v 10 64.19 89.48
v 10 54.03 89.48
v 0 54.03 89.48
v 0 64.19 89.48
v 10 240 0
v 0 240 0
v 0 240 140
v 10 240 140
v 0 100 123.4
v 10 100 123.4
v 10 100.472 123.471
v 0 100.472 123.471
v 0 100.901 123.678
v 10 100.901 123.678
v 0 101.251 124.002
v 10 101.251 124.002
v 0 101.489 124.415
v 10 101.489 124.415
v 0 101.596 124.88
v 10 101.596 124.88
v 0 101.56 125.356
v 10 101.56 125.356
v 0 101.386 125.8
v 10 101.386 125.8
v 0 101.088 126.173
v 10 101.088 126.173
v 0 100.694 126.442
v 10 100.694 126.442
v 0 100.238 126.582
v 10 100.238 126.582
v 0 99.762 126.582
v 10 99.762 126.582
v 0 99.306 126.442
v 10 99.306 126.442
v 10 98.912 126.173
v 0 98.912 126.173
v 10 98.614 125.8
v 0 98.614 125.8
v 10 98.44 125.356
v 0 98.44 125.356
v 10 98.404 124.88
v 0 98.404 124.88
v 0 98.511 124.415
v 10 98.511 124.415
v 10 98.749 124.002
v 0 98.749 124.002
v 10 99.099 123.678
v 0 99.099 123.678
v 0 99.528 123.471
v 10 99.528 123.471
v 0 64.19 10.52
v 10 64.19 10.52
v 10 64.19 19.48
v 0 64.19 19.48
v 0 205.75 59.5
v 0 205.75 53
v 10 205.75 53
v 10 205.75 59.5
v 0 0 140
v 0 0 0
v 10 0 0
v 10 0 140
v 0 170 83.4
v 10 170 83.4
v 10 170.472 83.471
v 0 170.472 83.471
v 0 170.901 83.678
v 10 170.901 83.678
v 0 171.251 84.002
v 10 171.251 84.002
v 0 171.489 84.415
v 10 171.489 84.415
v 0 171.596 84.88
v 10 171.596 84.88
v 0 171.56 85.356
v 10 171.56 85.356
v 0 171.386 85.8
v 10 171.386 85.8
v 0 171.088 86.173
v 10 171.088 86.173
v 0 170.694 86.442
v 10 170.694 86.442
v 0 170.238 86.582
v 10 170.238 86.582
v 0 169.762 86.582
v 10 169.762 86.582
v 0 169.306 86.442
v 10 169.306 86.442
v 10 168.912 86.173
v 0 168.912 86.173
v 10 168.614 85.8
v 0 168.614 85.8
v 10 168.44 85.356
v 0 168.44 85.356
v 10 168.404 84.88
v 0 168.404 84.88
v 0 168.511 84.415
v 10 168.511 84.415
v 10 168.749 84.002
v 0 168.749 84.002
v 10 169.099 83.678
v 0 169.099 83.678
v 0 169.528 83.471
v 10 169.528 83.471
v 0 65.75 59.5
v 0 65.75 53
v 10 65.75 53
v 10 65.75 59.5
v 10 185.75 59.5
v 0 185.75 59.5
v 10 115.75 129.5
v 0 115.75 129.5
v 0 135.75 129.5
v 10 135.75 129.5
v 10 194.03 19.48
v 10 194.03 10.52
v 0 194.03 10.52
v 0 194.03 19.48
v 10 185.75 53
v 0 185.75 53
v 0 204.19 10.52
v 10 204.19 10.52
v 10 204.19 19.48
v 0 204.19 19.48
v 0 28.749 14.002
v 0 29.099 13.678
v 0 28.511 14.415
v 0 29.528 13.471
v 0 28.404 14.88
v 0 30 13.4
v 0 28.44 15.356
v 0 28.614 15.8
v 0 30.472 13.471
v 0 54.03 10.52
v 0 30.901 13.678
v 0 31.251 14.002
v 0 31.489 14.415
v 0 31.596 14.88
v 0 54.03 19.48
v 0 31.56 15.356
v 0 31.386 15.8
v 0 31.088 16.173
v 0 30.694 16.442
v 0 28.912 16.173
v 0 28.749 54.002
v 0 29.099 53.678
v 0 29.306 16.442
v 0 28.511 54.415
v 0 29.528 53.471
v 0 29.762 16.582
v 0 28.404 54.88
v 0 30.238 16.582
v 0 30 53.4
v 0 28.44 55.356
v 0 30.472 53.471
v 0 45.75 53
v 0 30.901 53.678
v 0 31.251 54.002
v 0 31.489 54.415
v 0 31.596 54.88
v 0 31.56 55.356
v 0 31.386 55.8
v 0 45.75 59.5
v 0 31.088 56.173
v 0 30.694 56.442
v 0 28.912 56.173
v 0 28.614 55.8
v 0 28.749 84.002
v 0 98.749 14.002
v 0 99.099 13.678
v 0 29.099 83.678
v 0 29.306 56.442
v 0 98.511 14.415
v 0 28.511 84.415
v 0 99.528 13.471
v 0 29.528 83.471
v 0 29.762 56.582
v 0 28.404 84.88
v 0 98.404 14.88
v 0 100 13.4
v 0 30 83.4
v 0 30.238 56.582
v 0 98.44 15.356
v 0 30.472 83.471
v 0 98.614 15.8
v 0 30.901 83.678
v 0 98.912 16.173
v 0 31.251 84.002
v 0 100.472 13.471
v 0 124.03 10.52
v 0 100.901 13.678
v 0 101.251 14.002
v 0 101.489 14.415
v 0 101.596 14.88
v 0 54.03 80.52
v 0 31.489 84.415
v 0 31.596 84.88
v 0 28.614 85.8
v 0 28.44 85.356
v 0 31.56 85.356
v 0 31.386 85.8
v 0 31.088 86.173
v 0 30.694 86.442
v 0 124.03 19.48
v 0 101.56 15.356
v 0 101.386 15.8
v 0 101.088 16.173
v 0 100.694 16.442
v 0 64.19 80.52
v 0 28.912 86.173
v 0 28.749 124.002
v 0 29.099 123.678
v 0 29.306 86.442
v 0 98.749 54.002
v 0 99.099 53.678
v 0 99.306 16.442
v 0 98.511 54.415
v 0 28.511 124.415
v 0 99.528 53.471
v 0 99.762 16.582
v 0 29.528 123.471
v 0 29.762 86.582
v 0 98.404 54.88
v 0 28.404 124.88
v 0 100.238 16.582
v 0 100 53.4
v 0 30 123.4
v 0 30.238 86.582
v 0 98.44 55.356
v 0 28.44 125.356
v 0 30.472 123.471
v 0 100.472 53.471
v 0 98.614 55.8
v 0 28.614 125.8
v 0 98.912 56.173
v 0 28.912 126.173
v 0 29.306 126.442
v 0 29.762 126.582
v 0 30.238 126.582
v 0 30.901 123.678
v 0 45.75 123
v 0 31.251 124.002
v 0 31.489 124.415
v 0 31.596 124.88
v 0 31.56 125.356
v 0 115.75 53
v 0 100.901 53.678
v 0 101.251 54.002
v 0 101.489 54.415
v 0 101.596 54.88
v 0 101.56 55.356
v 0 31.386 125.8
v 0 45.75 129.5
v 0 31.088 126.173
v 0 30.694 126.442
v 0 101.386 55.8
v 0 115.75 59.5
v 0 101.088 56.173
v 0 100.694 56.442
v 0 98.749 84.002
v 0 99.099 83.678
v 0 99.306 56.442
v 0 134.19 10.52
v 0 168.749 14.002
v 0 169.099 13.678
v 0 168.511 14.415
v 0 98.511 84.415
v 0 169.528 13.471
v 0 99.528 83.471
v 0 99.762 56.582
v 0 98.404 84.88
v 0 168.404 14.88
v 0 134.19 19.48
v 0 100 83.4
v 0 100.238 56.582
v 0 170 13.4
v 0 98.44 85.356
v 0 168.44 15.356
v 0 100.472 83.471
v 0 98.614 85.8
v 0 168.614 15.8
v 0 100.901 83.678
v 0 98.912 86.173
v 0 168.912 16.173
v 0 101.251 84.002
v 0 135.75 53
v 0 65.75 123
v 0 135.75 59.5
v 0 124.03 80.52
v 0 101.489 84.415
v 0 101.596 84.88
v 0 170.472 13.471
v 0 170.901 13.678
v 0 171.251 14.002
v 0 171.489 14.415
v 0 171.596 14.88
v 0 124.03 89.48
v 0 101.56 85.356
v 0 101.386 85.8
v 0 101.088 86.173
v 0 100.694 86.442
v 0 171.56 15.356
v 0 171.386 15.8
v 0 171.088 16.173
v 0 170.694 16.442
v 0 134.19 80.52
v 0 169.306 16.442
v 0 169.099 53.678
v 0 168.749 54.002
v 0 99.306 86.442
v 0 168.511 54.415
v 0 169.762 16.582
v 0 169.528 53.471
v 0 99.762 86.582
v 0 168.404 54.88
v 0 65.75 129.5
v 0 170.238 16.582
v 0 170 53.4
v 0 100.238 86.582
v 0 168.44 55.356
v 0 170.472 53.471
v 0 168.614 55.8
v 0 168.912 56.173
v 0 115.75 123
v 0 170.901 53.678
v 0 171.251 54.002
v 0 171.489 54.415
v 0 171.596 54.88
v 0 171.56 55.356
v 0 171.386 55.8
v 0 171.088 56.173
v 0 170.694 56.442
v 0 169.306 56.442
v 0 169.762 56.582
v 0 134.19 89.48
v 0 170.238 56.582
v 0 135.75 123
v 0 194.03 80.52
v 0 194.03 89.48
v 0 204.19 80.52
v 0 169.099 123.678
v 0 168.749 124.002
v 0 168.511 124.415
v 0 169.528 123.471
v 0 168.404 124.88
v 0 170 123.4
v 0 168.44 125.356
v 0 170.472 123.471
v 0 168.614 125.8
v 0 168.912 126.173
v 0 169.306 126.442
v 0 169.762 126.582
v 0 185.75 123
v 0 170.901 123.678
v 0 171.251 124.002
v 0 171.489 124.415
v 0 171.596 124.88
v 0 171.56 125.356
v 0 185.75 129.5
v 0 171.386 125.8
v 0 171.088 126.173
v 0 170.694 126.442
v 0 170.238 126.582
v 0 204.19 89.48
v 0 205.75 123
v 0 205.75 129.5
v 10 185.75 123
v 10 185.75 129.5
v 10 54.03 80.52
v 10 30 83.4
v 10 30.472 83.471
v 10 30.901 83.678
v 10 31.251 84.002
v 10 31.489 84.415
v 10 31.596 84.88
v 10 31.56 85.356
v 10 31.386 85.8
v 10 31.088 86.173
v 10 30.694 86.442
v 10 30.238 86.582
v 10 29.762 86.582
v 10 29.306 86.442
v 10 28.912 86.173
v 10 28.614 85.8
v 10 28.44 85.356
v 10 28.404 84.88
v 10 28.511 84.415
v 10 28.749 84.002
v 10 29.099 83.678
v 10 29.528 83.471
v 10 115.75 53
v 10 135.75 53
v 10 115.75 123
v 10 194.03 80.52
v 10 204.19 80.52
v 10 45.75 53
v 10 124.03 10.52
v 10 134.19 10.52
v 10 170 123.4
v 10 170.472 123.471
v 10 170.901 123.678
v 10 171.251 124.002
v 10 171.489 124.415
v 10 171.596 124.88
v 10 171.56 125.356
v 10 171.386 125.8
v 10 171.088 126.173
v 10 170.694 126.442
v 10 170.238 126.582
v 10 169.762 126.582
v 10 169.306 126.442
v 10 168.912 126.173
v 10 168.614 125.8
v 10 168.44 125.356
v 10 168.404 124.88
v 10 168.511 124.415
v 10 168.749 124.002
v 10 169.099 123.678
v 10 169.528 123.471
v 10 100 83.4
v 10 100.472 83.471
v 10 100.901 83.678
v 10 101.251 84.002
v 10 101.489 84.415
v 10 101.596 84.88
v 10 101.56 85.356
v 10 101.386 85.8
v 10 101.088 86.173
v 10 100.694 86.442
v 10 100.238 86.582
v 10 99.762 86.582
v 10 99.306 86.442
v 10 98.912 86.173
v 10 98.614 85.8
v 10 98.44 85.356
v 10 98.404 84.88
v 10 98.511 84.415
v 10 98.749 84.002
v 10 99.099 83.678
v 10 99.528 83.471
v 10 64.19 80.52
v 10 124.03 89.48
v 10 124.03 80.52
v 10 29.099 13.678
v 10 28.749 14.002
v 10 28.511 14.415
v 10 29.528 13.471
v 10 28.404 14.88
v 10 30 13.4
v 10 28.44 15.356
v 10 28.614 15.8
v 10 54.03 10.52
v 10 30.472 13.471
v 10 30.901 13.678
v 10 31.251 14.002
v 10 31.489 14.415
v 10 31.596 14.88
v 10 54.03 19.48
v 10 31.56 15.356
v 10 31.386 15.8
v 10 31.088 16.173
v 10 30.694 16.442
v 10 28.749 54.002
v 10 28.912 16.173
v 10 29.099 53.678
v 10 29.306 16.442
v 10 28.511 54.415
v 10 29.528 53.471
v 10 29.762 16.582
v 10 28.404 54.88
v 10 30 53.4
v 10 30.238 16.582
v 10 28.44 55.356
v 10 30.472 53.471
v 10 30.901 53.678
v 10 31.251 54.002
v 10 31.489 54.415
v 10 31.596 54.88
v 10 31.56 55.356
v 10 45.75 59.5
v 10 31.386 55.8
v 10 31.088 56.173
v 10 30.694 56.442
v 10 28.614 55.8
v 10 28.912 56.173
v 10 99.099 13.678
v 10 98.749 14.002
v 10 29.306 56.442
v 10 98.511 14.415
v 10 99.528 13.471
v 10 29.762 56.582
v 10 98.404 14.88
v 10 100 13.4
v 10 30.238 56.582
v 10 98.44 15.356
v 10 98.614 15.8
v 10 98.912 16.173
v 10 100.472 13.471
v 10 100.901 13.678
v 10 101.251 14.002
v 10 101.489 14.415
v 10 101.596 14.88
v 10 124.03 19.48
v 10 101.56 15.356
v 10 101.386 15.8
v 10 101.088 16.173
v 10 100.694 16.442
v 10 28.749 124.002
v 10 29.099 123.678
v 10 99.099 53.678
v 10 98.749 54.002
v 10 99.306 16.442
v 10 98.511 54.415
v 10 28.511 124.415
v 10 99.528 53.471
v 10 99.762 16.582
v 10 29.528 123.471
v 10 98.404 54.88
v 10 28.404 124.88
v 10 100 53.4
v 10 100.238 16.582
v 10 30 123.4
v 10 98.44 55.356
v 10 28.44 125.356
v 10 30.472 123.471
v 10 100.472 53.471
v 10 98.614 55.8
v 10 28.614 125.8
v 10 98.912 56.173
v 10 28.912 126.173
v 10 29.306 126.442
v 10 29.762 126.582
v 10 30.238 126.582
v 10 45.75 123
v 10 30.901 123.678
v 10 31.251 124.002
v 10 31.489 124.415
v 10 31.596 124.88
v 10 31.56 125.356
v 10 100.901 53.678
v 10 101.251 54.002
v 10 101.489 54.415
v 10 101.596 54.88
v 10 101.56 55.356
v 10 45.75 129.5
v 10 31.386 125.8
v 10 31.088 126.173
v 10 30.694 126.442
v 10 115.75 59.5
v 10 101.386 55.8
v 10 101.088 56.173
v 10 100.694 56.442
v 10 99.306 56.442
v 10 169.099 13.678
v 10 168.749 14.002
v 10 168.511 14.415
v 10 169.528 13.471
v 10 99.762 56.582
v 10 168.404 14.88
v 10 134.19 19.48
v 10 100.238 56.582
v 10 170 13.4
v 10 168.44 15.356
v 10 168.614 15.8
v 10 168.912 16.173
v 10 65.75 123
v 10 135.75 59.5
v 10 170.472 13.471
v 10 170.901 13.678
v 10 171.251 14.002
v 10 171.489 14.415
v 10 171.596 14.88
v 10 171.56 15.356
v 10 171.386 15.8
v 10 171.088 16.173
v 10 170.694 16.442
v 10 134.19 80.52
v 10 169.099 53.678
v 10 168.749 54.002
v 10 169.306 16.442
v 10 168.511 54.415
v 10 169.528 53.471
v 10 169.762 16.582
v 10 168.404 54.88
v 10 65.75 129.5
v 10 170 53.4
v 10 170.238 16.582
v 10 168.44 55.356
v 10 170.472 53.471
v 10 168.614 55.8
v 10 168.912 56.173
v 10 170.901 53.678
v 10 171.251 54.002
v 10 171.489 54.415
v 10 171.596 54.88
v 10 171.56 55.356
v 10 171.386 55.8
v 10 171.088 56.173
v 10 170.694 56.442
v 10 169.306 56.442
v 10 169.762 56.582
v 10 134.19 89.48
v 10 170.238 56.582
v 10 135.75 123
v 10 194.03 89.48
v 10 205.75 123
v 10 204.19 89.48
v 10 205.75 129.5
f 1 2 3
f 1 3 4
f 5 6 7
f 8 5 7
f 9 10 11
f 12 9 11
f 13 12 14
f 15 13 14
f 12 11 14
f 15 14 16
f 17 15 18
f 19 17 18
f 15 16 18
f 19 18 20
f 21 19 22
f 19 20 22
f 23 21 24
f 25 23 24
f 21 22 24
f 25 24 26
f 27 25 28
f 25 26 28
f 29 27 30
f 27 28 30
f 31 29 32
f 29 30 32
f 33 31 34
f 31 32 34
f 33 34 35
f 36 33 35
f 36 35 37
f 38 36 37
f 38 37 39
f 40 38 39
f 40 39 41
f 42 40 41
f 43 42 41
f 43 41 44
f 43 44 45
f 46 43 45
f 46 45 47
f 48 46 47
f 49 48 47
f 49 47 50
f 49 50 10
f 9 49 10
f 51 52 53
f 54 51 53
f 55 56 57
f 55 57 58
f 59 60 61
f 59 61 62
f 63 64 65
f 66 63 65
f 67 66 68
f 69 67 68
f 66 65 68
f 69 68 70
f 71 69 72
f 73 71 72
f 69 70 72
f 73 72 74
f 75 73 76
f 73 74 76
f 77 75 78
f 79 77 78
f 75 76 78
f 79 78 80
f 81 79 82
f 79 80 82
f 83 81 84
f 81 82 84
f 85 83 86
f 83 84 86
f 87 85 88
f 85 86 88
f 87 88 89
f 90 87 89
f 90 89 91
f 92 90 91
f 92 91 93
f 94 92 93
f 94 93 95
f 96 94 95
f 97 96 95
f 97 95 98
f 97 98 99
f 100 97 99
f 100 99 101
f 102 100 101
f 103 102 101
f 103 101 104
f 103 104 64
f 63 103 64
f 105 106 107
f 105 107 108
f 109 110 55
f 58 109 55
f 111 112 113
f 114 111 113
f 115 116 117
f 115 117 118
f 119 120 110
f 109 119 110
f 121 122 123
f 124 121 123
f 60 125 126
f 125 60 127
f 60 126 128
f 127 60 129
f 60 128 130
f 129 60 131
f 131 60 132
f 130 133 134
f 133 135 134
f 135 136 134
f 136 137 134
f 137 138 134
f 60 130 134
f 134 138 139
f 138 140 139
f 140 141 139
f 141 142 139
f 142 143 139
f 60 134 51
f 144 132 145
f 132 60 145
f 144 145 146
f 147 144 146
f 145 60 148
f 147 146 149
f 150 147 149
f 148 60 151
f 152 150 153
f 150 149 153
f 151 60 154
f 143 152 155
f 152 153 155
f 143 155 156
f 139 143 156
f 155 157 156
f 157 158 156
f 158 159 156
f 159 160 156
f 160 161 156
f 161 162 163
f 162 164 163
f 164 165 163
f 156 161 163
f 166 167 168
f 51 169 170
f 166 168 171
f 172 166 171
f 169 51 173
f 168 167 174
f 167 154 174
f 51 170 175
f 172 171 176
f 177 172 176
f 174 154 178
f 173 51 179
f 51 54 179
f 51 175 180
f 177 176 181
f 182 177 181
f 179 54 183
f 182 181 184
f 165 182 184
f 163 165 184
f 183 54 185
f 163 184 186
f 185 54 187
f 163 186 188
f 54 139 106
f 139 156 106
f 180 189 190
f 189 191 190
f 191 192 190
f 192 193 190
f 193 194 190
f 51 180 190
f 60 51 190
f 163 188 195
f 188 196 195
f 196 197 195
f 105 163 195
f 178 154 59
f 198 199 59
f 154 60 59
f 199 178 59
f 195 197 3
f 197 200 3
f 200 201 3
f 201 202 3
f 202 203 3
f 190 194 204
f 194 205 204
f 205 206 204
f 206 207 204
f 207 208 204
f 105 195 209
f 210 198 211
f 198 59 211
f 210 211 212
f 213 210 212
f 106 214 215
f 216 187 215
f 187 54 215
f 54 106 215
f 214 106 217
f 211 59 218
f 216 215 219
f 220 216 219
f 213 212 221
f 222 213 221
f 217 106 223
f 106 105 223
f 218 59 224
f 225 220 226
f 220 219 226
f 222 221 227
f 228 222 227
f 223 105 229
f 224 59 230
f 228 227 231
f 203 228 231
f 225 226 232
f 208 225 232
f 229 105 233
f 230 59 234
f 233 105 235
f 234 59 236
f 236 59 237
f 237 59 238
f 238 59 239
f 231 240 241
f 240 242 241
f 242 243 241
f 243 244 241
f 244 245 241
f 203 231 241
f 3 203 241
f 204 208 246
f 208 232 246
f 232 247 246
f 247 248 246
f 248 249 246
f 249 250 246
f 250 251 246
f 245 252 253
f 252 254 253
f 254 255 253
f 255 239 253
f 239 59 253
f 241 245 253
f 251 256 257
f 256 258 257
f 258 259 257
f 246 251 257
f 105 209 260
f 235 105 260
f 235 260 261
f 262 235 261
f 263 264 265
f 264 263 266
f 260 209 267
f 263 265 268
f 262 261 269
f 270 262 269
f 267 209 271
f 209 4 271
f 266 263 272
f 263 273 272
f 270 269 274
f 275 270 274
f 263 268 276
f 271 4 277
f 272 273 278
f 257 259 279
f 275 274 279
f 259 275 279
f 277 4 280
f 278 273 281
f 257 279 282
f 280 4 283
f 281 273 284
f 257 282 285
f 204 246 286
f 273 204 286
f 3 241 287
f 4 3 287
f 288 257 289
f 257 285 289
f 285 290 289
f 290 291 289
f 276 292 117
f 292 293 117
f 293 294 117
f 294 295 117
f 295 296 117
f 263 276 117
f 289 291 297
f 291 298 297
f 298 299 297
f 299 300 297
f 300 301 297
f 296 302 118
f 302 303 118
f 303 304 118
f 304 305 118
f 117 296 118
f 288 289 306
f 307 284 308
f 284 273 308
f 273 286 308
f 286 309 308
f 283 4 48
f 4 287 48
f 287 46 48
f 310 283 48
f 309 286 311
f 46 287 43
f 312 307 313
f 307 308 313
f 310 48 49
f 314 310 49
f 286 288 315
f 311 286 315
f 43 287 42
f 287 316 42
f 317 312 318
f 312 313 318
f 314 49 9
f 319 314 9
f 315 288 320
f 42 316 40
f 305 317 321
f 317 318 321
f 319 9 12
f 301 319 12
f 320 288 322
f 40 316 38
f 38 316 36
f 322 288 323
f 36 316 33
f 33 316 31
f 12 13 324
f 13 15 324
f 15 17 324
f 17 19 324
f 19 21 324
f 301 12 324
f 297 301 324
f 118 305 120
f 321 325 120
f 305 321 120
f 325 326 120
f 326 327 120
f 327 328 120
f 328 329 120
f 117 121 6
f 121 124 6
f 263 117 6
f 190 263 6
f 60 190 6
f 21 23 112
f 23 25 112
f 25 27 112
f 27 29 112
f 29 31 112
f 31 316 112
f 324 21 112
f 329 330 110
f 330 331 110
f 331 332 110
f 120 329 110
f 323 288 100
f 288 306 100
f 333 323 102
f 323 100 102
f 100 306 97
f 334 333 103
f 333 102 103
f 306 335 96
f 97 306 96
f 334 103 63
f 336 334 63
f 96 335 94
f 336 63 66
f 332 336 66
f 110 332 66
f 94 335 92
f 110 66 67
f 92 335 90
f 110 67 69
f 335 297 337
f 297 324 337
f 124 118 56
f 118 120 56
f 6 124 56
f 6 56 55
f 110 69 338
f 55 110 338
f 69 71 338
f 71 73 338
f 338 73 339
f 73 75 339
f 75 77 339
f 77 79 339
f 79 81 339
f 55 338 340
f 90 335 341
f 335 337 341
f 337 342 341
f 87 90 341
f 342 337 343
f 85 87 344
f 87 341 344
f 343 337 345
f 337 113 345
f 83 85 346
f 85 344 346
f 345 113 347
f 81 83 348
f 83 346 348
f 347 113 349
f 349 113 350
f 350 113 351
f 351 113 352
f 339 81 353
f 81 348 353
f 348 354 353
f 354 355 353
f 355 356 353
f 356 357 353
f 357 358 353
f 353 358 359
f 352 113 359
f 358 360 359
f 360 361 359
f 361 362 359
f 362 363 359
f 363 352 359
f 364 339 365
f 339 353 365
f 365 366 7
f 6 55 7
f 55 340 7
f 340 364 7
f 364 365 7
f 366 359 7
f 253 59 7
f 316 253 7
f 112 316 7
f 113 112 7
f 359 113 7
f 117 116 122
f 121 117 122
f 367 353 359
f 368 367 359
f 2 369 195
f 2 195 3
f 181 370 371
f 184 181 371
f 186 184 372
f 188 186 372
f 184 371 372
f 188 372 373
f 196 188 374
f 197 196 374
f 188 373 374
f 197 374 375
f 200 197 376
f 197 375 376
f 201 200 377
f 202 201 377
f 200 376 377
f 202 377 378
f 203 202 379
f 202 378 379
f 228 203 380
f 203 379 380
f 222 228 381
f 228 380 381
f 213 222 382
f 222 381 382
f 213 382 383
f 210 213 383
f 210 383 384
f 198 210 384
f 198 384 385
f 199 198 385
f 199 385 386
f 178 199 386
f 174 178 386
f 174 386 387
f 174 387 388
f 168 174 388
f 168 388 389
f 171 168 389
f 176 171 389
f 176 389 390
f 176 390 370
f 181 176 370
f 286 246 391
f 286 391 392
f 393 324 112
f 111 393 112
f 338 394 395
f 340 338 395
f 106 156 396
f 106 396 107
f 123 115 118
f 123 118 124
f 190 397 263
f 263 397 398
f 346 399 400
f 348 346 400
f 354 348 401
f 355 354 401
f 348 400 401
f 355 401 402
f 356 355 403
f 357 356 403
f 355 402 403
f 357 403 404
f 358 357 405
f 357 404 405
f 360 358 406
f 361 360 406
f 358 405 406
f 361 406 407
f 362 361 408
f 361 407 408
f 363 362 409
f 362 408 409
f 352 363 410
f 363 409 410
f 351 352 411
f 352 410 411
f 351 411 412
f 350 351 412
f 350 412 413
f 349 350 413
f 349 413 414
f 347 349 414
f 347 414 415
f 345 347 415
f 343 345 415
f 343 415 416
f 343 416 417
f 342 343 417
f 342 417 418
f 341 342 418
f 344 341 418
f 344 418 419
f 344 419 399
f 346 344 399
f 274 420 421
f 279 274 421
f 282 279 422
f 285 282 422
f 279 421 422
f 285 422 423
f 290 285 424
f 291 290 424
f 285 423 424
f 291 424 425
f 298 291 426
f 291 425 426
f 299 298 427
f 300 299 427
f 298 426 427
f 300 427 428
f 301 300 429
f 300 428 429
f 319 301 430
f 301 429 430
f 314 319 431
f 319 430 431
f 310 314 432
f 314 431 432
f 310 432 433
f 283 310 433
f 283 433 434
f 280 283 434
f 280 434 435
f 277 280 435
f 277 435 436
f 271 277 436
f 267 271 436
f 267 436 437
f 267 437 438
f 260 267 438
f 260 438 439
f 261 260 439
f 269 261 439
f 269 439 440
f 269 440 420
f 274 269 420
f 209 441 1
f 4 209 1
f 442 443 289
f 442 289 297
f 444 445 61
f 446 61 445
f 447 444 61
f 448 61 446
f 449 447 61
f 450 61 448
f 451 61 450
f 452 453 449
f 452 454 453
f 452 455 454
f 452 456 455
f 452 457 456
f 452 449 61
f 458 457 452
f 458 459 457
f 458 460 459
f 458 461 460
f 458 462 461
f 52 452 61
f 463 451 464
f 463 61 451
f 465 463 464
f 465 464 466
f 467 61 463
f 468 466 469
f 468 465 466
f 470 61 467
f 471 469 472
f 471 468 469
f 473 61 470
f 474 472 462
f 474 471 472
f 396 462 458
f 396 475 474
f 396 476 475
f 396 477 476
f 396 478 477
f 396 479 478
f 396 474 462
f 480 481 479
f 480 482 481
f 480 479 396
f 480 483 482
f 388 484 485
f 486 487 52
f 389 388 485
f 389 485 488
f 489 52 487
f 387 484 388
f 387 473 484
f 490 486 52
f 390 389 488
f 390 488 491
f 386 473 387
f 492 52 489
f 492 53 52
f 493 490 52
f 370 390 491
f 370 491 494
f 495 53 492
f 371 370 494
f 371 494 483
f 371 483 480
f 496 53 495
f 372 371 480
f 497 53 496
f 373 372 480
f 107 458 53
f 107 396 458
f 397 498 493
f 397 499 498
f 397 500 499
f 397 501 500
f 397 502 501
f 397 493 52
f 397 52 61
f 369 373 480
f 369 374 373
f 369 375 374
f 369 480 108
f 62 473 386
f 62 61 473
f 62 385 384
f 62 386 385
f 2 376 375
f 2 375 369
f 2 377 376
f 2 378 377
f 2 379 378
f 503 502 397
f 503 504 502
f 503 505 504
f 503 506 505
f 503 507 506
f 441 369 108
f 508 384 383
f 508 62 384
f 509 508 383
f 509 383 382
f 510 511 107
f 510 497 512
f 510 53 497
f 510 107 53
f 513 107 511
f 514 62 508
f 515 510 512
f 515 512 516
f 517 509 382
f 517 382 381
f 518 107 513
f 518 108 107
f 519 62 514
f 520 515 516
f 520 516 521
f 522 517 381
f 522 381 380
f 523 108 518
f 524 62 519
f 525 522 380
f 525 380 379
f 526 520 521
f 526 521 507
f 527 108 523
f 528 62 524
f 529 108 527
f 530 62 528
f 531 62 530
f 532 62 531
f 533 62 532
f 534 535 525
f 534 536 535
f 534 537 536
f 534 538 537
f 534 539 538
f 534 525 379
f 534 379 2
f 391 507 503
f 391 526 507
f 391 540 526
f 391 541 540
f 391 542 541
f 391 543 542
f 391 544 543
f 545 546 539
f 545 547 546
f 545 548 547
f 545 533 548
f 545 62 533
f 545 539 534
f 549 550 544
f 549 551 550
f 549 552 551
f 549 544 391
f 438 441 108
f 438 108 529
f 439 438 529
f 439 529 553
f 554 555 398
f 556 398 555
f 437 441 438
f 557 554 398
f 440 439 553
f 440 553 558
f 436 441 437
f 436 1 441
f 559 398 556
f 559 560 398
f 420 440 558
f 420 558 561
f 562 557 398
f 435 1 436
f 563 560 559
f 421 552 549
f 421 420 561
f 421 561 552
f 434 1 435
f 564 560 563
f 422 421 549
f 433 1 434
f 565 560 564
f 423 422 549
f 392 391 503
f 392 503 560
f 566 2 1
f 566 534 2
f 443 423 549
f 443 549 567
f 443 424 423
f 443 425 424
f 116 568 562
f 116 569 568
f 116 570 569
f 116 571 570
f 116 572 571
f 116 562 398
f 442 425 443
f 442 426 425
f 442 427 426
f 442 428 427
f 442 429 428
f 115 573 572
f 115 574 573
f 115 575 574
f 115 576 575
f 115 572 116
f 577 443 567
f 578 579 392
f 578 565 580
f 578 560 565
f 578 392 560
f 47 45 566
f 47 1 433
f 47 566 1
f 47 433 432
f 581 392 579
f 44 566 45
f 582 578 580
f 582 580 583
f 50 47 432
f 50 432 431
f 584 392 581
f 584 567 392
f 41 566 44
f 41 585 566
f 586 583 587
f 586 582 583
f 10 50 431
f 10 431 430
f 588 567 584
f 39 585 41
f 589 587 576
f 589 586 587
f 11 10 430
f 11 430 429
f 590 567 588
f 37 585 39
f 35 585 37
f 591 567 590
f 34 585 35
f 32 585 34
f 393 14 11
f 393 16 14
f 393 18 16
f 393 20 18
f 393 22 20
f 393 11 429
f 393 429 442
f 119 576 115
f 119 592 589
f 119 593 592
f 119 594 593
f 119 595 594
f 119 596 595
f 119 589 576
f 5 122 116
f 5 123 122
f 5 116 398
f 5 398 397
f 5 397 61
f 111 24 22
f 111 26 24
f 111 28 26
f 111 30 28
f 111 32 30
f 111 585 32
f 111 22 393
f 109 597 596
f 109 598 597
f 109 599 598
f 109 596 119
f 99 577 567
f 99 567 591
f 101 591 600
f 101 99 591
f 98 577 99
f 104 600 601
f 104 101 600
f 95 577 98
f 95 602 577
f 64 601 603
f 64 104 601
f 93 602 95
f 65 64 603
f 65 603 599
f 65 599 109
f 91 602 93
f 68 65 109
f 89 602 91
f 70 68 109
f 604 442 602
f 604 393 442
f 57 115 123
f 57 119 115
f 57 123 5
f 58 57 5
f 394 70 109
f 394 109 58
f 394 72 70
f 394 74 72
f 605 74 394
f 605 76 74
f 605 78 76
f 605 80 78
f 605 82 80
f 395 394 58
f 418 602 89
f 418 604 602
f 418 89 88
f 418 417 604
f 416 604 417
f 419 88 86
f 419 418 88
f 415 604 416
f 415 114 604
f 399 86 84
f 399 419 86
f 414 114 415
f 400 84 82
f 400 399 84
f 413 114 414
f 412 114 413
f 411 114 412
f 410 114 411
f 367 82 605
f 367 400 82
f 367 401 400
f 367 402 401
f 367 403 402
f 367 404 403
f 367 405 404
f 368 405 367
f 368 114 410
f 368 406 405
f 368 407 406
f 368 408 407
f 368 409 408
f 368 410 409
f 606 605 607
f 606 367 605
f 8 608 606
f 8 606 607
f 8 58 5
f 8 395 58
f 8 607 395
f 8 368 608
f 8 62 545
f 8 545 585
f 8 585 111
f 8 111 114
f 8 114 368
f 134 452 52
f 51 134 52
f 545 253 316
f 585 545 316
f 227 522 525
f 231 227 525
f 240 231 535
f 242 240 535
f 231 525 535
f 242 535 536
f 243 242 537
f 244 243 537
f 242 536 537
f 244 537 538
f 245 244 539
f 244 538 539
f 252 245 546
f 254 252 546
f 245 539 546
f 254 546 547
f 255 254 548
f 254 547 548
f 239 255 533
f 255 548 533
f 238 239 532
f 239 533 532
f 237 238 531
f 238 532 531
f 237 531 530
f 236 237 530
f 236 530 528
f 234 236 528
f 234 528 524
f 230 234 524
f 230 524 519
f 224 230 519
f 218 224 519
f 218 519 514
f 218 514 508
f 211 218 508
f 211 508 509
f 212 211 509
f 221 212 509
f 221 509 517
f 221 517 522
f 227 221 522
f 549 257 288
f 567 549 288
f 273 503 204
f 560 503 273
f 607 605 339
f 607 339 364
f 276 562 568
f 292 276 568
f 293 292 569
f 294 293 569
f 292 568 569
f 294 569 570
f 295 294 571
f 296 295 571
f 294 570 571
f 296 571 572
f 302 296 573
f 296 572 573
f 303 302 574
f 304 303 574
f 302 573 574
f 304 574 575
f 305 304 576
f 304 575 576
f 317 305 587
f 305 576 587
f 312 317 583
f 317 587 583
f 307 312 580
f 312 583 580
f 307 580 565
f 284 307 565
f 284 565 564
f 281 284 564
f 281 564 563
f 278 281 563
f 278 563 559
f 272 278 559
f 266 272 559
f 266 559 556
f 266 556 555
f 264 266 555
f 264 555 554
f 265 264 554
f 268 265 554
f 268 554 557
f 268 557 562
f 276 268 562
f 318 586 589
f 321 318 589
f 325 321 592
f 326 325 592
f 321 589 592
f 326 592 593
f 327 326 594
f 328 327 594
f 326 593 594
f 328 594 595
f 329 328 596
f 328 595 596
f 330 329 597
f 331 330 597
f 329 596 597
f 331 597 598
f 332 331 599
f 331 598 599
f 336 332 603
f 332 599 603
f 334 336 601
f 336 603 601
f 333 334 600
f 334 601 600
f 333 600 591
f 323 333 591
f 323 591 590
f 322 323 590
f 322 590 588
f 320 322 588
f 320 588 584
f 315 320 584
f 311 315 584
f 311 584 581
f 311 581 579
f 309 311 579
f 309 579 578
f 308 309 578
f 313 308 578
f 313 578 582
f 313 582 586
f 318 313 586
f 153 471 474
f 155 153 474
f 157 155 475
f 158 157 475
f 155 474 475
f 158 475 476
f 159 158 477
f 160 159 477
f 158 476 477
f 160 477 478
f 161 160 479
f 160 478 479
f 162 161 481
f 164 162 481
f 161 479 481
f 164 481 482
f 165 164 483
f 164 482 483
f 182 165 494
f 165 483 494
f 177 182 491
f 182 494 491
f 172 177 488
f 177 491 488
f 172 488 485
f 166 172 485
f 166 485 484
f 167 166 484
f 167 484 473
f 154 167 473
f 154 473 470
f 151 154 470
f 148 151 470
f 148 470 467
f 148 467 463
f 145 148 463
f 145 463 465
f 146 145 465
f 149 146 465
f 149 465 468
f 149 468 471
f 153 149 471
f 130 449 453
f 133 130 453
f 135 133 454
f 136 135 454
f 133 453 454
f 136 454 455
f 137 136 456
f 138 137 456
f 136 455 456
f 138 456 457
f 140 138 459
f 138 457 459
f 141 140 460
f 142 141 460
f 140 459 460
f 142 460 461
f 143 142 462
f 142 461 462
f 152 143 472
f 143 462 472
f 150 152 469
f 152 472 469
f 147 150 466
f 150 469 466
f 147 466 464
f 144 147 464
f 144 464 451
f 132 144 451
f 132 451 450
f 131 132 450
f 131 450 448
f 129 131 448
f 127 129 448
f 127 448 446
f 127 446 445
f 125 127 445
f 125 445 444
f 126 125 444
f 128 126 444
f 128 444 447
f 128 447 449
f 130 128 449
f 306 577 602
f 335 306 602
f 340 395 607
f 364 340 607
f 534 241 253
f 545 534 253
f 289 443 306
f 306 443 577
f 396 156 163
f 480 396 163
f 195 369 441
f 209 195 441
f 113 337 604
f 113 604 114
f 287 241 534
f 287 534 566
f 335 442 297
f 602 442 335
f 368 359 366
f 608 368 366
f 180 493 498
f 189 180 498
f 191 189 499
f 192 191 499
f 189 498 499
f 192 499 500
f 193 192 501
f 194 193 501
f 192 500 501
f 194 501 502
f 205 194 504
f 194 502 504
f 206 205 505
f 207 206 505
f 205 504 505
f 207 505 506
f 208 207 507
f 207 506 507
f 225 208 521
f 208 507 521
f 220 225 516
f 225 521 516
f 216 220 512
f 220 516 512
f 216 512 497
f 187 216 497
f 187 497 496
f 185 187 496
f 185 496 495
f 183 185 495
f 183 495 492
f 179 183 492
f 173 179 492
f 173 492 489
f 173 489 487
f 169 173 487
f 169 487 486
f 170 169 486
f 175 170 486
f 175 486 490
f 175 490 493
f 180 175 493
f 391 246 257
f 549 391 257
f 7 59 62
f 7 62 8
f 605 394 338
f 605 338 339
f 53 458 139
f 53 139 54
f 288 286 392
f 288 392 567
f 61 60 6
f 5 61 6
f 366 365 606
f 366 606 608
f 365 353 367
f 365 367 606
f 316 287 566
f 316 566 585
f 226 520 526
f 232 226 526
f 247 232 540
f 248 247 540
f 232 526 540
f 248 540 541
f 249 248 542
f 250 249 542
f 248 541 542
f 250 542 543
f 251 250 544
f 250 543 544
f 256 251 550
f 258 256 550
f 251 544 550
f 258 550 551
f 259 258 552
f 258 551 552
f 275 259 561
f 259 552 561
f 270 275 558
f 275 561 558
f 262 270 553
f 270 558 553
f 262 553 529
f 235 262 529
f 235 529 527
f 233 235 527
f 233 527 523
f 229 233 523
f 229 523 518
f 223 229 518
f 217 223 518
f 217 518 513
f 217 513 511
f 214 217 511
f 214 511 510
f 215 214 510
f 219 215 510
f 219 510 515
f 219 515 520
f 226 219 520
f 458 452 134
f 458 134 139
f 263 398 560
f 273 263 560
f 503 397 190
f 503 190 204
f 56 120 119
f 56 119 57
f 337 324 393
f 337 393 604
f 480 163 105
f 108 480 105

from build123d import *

# Parameters (mm, degrees)
CROQUIS2_W              = 240
CROQUIS2_H              = 140
SALIENTE_EXTRUIR1_DEPTH = 10
CROQUIS3_W              = 20
CROQUIS3_H              = 6.5
CROQUIS3_W_2            = 10.16
CROQUIS3_H_2            = 8.96
CROQUIS3_R              = 1.6
CORTAR_EXTRUIR1_DEPTH   = 279.028775489
MATRIZL1_COUNT          = 3
MATRIZL1_PITCH          = 70
MATRIZL1_COUNT_DIR2     = 2
MATRIZL1_PITCH_DIR2     = 70


with BuildPart() as part:
    # Croquis2 → Saliente-Extruir1 (new body)
    with BuildSketch(Plane.YZ):
        with Locations((120, 70)):
            Rectangle(CROQUIS2_W, CROQUIS2_H)
    extrude(amount=SALIENTE_EXTRUIR1_DEPTH)

    # Croquis3 → Cortar-Extruir1 (cut, symmetric)
    with BuildSketch(Plane.YZ.offset(10)):
        with Locations((55.75, 126.25)):
            Rectangle(CROQUIS3_W, CROQUIS3_H)
        with Locations((59.11, 85)):
            Rectangle(CROQUIS3_W_2, CROQUIS3_H_2)
        with Locations((30, 125)):
            Circle(CROQUIS3_R)
        with Locations((30, 85)):
            Circle(CROQUIS3_R)
    cortar_extruir1 = extrude(amount=CORTAR_EXTRUIR1_DEPTH, both=True, mode=Mode.SUBTRACT)

    # MatrizL1: Cortar-Extruir1 3 × 2
    with Locations(*[(0, i * MATRIZL1_PITCH, -j * MATRIZL1_PITCH_DIR2) for i in range(MATRIZL1_COUNT) for j in range(MATRIZL1_COUNT_DIR2) if (i, j) != (0, 0)]):
        add(cortar_extruir1, mode=Mode.SUBTRACT)


solid = part.part
